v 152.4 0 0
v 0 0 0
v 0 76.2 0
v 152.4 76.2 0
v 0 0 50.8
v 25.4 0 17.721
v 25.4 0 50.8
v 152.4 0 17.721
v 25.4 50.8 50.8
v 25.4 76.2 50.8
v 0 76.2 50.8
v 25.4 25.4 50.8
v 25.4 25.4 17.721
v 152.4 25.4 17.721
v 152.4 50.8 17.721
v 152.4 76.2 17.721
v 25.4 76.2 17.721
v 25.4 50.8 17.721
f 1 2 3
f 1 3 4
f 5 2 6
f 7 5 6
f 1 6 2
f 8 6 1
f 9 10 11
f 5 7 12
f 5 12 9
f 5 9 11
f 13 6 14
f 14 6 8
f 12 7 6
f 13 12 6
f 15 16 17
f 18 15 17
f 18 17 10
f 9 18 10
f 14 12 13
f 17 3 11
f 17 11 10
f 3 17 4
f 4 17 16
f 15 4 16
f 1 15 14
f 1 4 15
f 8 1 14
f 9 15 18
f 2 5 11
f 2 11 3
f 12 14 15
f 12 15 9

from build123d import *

# Parameters (mm, degrees)
F1_DEPTH = 76.2
F3_DEPTH = 25.4
F5_DEPTH = 25.4


with BuildPart() as f1:
    # F0 (on Front) → F1 (new body)
    with BuildSketch(Plane.XZ):
        Polygon((0, 50.8), (0, 0), (152.4, 0), (152.4, 17.720935), (25.4, 50.8), align=None)
    extrude(amount=-F1_DEPTH)

    # F2 (on face) → F3 (cut)
    with BuildSketch(Plane.XZ):
        Polygon((25.4, 17.720935), (152.4, 17.720935), (25.4, 50.8), align=None)
    extrude(amount=-F3_DEPTH, mode=Mode.SUBTRACT)

    # F4 (on face) → F5 (cut)
    with BuildSketch(Plane(origin=(0, 76.2, 0), x_dir=(-1, 0, 0), z_dir=(0, 1, 0))):
        Polygon((-25.4, 50.8), (-152.4, 17.720935), (-25.4, 17.720935), align=None)
    extrude(amount=-F5_DEPTH, mode=Mode.SUBTRACT)


solid = f1.part
